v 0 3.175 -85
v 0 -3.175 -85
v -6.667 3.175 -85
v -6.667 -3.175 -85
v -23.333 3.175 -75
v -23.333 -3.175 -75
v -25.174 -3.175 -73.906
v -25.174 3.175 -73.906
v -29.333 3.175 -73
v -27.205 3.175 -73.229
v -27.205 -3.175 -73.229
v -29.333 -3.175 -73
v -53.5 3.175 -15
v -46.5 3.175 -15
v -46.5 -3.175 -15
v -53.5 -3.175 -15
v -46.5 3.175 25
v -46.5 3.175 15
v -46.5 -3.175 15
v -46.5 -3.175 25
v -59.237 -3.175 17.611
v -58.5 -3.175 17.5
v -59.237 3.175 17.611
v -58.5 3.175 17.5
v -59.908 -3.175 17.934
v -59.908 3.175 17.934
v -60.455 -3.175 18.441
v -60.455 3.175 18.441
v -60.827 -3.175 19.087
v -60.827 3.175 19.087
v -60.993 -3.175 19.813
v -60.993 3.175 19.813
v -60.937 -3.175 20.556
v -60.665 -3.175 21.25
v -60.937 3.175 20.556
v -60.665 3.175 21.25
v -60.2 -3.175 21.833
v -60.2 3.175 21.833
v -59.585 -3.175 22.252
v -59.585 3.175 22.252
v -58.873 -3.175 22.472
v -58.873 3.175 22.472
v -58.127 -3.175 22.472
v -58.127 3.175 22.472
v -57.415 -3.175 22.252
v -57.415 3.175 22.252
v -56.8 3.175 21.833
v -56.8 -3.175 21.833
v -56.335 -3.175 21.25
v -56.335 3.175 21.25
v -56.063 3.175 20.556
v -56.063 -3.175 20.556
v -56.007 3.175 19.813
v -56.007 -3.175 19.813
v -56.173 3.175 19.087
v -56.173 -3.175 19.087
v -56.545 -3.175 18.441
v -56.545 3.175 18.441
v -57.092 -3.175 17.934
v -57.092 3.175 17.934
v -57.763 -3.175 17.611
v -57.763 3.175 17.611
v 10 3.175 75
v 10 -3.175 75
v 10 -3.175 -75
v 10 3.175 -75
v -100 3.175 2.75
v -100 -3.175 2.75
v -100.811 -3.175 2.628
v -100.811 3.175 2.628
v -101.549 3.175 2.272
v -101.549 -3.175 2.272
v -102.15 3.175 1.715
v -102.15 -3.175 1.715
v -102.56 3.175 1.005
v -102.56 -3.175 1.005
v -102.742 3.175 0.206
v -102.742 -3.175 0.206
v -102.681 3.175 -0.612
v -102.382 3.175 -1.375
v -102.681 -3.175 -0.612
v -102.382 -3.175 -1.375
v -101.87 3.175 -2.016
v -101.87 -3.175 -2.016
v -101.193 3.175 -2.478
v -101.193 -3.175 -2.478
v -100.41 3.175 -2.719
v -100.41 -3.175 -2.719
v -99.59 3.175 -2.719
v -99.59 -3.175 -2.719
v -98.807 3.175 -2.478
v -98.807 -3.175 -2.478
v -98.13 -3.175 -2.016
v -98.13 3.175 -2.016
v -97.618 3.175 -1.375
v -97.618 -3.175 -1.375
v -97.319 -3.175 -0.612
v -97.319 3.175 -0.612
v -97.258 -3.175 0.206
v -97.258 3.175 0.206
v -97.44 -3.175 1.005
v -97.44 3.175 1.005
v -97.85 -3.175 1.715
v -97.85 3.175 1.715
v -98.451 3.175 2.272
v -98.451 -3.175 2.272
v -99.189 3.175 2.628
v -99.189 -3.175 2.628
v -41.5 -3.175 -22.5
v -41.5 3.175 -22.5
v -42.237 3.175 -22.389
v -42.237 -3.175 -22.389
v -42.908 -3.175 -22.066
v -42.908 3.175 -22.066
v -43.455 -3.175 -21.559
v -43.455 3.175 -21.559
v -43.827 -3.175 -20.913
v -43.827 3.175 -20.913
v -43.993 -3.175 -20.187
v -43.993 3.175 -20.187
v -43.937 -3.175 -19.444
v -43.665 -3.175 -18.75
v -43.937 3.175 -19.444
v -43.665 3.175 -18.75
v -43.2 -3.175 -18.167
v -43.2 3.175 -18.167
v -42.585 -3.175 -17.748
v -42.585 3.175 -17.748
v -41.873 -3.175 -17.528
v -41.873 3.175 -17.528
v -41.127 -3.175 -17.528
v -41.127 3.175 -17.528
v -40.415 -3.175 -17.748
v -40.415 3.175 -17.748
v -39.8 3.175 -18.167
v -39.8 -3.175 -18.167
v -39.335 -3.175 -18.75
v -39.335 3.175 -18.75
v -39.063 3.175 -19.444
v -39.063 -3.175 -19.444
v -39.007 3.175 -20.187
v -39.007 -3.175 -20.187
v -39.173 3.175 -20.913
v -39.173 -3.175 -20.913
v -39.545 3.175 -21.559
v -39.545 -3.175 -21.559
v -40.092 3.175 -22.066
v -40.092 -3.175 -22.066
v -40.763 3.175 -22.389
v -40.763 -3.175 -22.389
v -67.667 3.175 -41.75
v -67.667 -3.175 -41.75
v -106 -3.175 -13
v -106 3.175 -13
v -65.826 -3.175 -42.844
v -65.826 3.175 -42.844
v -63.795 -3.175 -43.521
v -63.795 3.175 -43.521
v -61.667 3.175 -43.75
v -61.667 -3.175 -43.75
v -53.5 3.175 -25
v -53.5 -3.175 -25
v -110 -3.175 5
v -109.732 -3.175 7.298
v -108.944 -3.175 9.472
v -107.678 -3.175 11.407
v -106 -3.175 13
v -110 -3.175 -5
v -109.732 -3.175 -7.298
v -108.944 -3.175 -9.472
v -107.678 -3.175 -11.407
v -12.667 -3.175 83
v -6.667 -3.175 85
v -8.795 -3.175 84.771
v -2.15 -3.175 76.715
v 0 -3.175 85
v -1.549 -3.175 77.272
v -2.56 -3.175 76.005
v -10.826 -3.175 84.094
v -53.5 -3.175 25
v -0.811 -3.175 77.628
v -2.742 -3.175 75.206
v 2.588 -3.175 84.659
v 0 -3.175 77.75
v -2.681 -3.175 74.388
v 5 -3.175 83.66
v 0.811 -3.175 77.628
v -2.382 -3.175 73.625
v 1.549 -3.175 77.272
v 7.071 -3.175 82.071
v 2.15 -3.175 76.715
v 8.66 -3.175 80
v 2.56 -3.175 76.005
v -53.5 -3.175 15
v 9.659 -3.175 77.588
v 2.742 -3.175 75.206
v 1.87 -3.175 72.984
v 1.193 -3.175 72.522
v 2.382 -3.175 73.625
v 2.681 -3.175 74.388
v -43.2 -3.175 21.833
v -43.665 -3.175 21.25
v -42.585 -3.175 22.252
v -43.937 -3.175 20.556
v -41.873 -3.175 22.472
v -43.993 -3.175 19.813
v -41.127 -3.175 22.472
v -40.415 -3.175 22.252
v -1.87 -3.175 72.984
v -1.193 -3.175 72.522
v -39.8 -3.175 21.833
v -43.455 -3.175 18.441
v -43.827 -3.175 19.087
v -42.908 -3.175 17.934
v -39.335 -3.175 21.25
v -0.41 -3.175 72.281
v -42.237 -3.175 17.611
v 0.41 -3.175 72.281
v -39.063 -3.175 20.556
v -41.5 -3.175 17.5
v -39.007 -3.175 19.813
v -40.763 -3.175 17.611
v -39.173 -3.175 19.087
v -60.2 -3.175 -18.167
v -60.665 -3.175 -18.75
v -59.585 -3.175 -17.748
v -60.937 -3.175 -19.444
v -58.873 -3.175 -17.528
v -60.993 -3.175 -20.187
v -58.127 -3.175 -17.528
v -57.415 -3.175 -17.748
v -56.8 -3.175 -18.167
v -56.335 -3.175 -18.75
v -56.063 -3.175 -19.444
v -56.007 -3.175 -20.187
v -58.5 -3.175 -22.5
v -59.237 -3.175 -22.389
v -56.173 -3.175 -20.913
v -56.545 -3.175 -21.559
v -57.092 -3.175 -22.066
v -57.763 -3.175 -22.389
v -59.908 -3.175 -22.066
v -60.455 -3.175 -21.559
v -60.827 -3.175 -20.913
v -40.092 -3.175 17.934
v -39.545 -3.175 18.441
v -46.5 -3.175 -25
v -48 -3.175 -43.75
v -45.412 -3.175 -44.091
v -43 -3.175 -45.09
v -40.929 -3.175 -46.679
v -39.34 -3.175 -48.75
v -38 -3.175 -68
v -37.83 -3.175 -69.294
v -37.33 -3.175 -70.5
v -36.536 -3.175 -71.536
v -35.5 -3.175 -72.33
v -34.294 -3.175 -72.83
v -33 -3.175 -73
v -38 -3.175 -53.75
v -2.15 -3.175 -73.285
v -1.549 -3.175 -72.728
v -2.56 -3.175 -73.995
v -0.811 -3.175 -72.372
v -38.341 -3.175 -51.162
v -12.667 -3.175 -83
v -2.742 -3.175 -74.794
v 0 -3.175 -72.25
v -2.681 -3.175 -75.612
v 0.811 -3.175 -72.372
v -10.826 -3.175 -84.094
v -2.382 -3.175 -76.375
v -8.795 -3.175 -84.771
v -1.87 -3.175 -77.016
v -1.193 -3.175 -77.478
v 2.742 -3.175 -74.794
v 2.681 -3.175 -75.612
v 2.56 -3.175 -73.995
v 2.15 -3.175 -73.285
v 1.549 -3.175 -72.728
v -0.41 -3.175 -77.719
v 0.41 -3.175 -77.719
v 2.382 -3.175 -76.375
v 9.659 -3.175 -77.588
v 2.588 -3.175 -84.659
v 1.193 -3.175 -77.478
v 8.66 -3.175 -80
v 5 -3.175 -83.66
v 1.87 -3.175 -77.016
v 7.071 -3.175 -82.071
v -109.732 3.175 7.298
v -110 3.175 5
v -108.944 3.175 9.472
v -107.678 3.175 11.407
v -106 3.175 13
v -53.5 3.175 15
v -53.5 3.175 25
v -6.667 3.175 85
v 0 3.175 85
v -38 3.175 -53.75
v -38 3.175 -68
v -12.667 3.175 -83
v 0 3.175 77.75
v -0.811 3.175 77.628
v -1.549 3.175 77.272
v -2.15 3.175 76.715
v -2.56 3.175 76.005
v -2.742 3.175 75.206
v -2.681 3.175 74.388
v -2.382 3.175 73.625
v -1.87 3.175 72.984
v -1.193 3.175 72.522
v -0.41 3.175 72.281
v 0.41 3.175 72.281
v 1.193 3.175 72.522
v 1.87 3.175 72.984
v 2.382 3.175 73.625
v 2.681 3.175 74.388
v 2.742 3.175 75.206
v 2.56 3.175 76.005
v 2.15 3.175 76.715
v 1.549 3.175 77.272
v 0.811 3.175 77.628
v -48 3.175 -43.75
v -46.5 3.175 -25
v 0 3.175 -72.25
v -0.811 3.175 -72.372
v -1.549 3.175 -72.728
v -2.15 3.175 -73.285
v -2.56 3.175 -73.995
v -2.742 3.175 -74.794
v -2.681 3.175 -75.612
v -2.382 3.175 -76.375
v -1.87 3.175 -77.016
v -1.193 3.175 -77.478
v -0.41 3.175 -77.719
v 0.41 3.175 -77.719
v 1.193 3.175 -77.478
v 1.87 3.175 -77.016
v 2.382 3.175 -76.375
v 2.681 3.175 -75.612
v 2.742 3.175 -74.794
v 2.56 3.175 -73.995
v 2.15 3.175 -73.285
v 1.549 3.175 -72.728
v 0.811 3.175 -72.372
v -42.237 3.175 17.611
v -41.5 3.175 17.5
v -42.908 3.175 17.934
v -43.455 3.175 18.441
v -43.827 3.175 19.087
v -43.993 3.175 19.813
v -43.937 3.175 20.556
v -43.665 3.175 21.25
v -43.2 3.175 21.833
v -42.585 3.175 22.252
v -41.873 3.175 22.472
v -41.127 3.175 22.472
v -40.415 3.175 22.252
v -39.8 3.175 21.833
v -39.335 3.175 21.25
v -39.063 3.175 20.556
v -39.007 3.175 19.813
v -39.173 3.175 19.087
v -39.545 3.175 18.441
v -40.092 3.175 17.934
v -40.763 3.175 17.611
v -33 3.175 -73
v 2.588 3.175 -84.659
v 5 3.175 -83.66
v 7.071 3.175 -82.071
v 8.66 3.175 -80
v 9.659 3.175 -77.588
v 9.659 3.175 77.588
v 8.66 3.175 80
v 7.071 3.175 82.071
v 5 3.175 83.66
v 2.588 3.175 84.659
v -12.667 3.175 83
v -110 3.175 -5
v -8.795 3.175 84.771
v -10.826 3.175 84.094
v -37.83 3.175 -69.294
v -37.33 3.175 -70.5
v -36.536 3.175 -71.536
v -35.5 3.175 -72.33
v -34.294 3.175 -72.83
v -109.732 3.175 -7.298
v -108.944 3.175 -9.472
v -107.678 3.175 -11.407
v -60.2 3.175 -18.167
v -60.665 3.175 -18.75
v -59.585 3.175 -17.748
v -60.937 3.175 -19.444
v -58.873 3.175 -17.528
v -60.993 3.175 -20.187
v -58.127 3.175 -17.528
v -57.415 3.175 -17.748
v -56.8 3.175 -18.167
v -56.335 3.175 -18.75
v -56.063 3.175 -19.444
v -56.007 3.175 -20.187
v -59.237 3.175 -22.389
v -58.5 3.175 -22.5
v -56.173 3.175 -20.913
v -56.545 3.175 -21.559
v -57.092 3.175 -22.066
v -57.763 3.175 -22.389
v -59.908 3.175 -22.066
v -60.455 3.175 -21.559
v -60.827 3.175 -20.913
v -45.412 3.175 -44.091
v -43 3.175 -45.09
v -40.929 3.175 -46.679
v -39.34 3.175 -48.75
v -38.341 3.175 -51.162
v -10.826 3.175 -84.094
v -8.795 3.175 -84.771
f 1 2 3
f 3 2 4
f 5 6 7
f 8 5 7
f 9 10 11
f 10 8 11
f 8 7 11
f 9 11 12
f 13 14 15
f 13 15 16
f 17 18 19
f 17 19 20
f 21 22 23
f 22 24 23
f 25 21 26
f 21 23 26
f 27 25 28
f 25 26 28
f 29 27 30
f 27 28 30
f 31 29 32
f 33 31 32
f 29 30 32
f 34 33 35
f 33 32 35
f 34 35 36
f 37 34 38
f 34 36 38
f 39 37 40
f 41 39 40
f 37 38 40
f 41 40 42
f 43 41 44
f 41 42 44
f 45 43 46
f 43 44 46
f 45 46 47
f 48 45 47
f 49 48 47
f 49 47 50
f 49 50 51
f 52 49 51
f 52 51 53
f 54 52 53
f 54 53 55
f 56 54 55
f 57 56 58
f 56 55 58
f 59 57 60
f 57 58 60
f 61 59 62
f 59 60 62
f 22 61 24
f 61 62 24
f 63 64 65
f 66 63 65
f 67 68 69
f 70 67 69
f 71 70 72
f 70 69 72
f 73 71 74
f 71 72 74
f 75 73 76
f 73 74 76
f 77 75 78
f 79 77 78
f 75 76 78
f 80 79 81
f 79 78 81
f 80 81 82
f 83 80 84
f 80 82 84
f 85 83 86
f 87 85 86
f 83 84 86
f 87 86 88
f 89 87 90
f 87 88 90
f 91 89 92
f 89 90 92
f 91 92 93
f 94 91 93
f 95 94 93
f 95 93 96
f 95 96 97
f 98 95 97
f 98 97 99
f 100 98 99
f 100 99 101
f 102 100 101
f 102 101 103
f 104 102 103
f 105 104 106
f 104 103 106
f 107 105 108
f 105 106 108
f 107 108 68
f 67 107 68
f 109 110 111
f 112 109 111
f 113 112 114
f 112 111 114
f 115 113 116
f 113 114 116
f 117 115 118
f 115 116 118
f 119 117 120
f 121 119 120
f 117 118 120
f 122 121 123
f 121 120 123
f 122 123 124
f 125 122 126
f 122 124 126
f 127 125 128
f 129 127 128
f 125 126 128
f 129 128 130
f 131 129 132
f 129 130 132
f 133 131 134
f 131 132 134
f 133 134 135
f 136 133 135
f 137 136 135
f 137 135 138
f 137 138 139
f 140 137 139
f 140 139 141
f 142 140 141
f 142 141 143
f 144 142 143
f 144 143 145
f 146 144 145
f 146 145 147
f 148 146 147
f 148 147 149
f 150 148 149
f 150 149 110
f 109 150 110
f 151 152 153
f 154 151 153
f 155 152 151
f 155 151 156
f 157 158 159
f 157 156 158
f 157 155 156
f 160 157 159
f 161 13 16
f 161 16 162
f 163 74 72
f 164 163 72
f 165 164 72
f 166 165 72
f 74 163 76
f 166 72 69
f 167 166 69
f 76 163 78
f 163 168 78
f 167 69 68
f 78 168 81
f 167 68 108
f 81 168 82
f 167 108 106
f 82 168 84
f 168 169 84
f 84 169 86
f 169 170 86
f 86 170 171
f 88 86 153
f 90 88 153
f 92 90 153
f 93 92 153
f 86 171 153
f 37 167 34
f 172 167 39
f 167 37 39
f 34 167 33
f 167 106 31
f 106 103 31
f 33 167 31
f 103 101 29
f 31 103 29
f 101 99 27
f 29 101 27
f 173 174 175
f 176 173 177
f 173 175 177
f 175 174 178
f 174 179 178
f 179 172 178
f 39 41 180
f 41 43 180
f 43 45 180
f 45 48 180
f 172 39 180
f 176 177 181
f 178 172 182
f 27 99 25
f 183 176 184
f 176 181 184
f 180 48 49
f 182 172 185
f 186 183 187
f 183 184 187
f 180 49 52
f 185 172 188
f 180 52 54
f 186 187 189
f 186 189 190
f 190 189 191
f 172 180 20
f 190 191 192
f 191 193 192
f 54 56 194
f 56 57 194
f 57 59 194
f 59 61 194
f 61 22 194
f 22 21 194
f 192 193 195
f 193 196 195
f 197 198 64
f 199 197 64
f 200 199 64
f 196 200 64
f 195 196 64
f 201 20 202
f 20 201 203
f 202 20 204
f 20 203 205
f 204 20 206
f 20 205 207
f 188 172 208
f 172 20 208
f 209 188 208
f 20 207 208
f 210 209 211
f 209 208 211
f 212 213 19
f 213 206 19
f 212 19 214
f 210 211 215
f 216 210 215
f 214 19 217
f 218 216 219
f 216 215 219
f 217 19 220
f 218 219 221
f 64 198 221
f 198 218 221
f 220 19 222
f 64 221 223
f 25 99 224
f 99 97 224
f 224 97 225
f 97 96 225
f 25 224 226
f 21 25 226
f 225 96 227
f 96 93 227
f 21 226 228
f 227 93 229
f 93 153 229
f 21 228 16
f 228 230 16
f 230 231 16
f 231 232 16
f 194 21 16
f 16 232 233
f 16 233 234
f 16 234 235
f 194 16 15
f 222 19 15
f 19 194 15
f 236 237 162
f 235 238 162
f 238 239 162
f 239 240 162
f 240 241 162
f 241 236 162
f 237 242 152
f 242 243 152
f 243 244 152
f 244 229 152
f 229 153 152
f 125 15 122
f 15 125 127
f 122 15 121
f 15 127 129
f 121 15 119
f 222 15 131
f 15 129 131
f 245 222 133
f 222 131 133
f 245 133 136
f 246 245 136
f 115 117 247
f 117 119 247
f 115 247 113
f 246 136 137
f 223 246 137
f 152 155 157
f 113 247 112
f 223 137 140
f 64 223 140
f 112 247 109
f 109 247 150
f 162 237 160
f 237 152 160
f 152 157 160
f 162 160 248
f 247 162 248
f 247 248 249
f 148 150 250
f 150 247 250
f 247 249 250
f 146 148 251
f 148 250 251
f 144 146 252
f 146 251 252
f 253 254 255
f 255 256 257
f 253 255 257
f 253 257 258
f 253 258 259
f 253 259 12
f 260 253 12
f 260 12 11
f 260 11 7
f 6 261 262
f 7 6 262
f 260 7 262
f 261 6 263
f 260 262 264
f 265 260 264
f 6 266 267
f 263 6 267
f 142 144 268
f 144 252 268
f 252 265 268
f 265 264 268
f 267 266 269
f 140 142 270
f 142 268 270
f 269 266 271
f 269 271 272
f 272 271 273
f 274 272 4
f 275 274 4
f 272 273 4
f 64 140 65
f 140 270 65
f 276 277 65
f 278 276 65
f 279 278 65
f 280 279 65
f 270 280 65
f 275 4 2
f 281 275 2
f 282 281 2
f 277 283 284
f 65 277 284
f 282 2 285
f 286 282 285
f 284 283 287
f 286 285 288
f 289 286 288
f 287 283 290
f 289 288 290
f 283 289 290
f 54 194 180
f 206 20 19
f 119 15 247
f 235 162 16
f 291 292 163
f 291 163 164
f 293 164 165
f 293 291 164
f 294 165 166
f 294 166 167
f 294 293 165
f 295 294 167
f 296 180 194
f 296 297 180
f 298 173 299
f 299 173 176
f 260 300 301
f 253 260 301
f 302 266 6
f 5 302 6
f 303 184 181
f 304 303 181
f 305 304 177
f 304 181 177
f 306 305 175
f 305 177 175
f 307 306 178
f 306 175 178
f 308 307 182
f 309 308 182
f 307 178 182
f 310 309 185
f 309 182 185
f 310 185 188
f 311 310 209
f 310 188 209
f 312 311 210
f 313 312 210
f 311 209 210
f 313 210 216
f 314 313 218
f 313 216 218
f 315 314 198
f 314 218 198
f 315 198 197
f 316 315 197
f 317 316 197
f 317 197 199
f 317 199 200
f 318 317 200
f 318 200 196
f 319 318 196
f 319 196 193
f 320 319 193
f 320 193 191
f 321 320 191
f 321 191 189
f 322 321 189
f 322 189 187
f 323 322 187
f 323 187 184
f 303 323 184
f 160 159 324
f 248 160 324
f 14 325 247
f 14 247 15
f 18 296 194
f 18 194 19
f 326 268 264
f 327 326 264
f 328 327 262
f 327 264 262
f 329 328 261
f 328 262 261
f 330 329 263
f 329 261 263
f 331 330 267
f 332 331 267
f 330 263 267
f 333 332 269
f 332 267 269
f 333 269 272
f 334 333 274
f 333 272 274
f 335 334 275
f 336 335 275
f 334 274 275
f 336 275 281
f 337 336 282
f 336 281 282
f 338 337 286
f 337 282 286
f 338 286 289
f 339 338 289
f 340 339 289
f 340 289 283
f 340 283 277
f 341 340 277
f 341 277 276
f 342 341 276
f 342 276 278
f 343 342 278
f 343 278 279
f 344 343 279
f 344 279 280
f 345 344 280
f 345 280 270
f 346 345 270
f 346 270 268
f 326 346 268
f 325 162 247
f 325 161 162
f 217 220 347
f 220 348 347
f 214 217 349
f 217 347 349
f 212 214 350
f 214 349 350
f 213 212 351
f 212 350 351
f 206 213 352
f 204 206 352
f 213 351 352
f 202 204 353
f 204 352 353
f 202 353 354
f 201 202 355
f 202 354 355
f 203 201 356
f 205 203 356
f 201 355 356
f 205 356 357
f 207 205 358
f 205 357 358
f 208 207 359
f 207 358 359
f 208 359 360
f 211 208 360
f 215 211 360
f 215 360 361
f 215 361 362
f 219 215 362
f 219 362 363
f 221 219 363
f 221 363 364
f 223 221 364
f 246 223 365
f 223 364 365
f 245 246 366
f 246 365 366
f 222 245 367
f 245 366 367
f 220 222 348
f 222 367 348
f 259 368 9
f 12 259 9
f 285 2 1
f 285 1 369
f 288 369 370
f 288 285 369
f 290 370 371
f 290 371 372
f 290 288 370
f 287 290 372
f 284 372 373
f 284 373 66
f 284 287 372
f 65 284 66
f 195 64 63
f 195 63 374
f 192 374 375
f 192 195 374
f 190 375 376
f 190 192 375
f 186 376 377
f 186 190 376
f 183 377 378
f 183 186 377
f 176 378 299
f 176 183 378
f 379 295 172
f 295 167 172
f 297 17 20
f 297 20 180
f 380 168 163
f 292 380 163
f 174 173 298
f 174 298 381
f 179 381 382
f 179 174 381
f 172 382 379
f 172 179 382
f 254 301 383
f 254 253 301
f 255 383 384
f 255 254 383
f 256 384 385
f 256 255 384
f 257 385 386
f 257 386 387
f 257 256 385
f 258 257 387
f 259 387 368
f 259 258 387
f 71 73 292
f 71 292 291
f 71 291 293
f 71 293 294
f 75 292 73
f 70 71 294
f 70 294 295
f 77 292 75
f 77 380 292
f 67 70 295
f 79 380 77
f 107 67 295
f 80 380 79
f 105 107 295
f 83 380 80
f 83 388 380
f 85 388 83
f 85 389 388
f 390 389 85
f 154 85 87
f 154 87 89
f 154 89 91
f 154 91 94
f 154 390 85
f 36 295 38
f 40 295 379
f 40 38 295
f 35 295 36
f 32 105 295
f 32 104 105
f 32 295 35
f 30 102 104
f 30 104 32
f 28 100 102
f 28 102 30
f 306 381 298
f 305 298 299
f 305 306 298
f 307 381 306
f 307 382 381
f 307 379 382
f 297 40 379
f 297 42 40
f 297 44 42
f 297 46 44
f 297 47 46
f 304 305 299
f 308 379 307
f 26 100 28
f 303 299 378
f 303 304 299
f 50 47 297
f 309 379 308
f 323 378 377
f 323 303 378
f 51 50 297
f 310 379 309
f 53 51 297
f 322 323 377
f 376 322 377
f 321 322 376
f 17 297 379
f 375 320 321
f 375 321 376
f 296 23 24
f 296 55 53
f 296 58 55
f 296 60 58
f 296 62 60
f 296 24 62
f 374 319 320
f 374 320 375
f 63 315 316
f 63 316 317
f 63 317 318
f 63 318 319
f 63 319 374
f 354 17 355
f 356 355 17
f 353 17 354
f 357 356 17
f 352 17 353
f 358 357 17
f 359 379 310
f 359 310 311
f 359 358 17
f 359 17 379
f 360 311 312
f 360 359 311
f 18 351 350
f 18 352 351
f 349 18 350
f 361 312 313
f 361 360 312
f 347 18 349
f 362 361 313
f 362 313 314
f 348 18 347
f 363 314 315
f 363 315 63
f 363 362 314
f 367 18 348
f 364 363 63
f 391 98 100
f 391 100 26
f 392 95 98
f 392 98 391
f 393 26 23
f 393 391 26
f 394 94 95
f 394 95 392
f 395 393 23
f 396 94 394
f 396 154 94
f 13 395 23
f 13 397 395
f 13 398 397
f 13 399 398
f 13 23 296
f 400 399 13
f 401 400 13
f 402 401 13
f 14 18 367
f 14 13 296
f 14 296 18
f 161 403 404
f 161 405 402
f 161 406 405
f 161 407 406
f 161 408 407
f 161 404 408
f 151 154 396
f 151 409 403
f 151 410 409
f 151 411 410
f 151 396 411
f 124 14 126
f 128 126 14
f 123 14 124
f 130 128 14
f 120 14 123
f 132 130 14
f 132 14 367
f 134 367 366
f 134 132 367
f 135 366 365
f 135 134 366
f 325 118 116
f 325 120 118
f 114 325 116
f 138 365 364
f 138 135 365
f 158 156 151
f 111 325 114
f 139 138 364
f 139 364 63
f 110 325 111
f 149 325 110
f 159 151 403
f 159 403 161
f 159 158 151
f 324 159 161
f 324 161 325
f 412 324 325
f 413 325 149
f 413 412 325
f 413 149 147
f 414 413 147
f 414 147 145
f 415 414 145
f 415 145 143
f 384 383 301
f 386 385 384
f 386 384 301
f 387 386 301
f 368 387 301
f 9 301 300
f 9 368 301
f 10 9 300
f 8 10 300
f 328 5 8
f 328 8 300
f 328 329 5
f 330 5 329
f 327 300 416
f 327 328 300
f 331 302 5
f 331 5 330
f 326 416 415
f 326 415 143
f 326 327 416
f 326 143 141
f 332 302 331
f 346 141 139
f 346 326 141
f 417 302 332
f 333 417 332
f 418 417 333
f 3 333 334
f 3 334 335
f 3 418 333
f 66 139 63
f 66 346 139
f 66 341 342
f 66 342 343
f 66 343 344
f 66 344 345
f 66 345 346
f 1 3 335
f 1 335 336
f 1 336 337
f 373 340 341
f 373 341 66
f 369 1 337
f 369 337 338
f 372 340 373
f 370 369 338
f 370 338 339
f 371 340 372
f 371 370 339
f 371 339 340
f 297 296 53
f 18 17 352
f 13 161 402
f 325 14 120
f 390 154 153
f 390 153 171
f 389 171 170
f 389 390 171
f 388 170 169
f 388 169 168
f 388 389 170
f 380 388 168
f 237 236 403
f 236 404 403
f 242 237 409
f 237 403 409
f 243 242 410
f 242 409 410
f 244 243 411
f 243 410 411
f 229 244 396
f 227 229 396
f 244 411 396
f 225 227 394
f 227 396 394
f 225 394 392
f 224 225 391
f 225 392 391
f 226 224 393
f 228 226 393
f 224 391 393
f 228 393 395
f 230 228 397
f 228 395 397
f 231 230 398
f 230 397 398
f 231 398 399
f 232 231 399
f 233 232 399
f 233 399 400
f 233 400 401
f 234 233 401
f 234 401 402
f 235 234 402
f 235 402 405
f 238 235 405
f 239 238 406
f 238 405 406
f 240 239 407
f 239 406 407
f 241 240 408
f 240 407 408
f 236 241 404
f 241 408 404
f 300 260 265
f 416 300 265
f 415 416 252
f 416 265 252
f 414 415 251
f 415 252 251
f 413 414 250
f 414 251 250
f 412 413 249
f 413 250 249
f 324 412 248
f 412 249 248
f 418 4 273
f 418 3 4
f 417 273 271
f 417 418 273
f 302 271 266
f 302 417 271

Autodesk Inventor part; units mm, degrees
ref_plane "YZ Plane" through (0, 0, 0) normal (1, 0, 0) x (0, 1, 0)
ref_plane "XZ Plane" through (0, 0, 0) normal (0, 1, 0) x (-1, 0, 0)
ref_plane "XY Plane" through (0, 0, 0) normal (0, 0, 1) x (1, 0, 0)
sketch "Sketch1" plane through (0, 0, 0) normal (0, 1, 0) x (-1, 0, 0)
  line L0 (10, -85) -> (110, -10)
  line L1 (110, -10) -> (110, 10)
  line L2 (110, 10) -> (10, 85)
  line L3 (10, 85) -> (-10, 85)
  line L4 (-10, 85) -> (-10, -85)
  line L5 (-10, -85) -> (10, -85)
  point P0 (0, 0)
  point P1 (100, 0)
  point P2 (0, -75)
  point P3 (0, 75)
  point P4 (-10, 0)
  point P5 (110, 0)
  dimension "d0" = 170
  dimension "d1" = 100
  dimension "d2" = 150
  dimension "d3" = 75
  dimension "d4" = 10
  dimension "d5" = 10
  dimension "d6" = 36.87
  dimension "d7" = 20
  dimension "d8" = 20
extrude "Extrusion1" add sketch "Sketch1" along normal mid plane 6.35
fillet "Fillet1" radius 10 6 edges at (-10, 0, 85) (10, 0, 85) (10, 0, -85) (-10, 0, -85) (-110, 0, -10) (-110, 0, 10)
sketch "Sketch2" plane through (0, 3.175, 0) normal (0, 1, 0) x (1, 0, 0)
  arc A0 (0, -85) -> (10, -75) centre (0, -75) ccw projected
  arc A1 (10, 75) -> (0, 85) centre (0, 75) ccw projected
  line L0 (-110, 5) -> (-110, -5) projected
  point P0 (0, 0)
  point P1 (-100, 0)
  dimension "d12" = 10
hole "Hole1" at (-100, 3.175, 0) at (0, 3.175, -75) at (0, 3.175, 75) direction (0, -1, 0) diameter 5.5 depth 7.6 tip angle 118
sketch "Sketch3" plane through (0, 3.175, 0) normal (0, 1, 0) x (1, 0, 0)
  circle A0 centre (-100, 0) radius 2.75 projected
  line L0 (-65, 43.75) -> (-38, 43.75)
  line L1 (-38, 43.75) -> (-38, 64)
  line L2 (-38, 64) -> (-65, 43.75)
  line L3 (-12.6667, 83) -> (-106, 13) projected
  point P0 (0, 0)
  dimension "d20" = 35
  dimension "d21" = 27
extrude "Extrusion2" cut sketch "Sketch3" against normal blind 10 contours L2 L1 L0
sketch "Sketch6" plane through (0, 3.175, 0) normal (0, 1, 0) x (1, 0, 0)
  line L0 (-38, 43.75) -> (-38, 64) projected
  line L1 (-38, 64) -> (-38, 73)
  line L2 (-38, 73) -> (-26, 73)
  line L3 (-38, 64) -> (-12.6667, 83) projected
  point P0 (0, 0)
  dimension "d41" = 9
extrude "Extrusion4" add sketch "Sketch6" against normal up to surface (6.35 mm away)
fillet "Fillet2" radius 10 3 edges at (-65, 0, -43.75) (-38, 0, -43.75) (-26, 0, -73)
fillet "Fillet2" radius 5 1 edges at (-38, 0, -73)
sketch "Sketch4" plane through (0, -3.175, 0) normal (0, -1, 0) x (1, 0, 0)
  line L0 (-58.5, -20) -> (-41.5, -20)
  line L1 (0, 0) -> (-6.0642, 0)
  point P0 (-50, -20)
  point P1 (-58.5, 20)
  point P2 (-41.5, 20)
  point P3 (-50, 20)
  dimension "d25" = 50
  dimension "d26" = 17
  dimension "d27" = 20
hole "Hole2" at (-58.5, -3.175, -20) at (-41.5, -3.175, -20) at (-41.5, -3.175, 20) at (-58.5, -3.175, 20) at (-50, -3.175, -20) at (-50, -3.175, 20) direction (0, 1, 0) diameter 5 end through all
sketch "Sketch5" plane through (0, 3.175, 0) normal (0, 1, 0) x (1, 0, 0)
  line L0 (-38, 68) -> (-38, 53.75) projected
  line L1 (-48, 43.75) -> (-61.6667, 43.75) projected
  line L2 (-67.6667, 41.75) -> (-106, 13) projected
  arc A0 (-106, 13) -> (-110, 5) centre (-100, 5) ccw projected
  line L3 (-110, 5) -> (-110, -5) projected
  arc A1 (-110, -5) -> (-106, -13) centre (-100, -5) ccw projected
  line L4 (-106, -13) -> (-12.6667, -83) projected
  arc A2 (-12.6667, -83) -> (-6.6667, -85) centre (-6.6667, -75) ccw projected
  line L5 (-6.6667, -85) -> (0, -85) projected
  arc A3 (0, -85) -> (10, -75) centre (0, -75) ccw projected
  line L6 (10, -75) -> (10, 75) projected
  arc A4 (10, 75) -> (0, 85) centre (0, 75) ccw projected
  line L7 (0, 85) -> (-6.6667, 85) projected
  arc A5 (-6.6667, 85) -> (-12.6667, 83) centre (-6.6667, 75) ccw projected
  line L8 (-12.6667, 83) -> (-23.3333, 75) projected
  circle A6 centre (0, 75) radius 2.75 projected
  circle A7 centre (-100, 0) radius 2.75 projected
  circle A8 centre (0, -75) radius 2.75 projected
  line L9 (-53.5, 25) -> (-46.5, 25)
  line L10 (-46.5, 25) -> (-46.5, 15)
  line L11 (-46.5, 15) -> (-53.5, 15)
  line L12 (-53.5, 15) -> (-53.5, 25)
  line L13 (-53.5, 25) -> (-46.5, 15) construction
  line L14 (-46.5, 25) -> (-53.5, 15) construction
  line L15 (-53.5, -15) -> (-46.5, -15)
  line L16 (-46.5, -15) -> (-46.5, -25)
  line L17 (-46.5, -25) -> (-53.5, -25)
  line L18 (-53.5, -25) -> (-53.5, -15)
  line L19 (-53.5, -15) -> (-46.5, -25) construction
  line L20 (-46.5, -15) -> (-53.5, -25) construction
  line L21 (-29.3333, 73) -> (-33, 73) projected
  arc A9 (-61.6667, 43.75) -> (-67.6667, 41.75) centre (-61.6667, 33.75) ccw projected
  arc A10 (-48, 43.75) -> (-38, 53.75) centre (-48, 53.75) ccw projected
  arc A11 (-33, 73) -> (-38, 68) centre (-33, 68) ccw projected
  arc A12 (-29.3333, 73) -> (-23.3333, 75) centre (-29.3333, 83) ccw projected
  point P0 (0, 0)
  point P1 (-50, 20)
  point P2 (-50, -20)
  dimension "d35" = 7
  dimension "d36" = 10
  dimension "d37" = 7
  dimension "d38" = 10
extrude "Extrusion3" cut sketch "Sketch5" against normal blind 10 contours L9 L10 L11 L12 | L15 L16 L17 L18
properties part number "Y_Axis_Carriage_Plate_LM3039" material "Acetal Resin, Black"
